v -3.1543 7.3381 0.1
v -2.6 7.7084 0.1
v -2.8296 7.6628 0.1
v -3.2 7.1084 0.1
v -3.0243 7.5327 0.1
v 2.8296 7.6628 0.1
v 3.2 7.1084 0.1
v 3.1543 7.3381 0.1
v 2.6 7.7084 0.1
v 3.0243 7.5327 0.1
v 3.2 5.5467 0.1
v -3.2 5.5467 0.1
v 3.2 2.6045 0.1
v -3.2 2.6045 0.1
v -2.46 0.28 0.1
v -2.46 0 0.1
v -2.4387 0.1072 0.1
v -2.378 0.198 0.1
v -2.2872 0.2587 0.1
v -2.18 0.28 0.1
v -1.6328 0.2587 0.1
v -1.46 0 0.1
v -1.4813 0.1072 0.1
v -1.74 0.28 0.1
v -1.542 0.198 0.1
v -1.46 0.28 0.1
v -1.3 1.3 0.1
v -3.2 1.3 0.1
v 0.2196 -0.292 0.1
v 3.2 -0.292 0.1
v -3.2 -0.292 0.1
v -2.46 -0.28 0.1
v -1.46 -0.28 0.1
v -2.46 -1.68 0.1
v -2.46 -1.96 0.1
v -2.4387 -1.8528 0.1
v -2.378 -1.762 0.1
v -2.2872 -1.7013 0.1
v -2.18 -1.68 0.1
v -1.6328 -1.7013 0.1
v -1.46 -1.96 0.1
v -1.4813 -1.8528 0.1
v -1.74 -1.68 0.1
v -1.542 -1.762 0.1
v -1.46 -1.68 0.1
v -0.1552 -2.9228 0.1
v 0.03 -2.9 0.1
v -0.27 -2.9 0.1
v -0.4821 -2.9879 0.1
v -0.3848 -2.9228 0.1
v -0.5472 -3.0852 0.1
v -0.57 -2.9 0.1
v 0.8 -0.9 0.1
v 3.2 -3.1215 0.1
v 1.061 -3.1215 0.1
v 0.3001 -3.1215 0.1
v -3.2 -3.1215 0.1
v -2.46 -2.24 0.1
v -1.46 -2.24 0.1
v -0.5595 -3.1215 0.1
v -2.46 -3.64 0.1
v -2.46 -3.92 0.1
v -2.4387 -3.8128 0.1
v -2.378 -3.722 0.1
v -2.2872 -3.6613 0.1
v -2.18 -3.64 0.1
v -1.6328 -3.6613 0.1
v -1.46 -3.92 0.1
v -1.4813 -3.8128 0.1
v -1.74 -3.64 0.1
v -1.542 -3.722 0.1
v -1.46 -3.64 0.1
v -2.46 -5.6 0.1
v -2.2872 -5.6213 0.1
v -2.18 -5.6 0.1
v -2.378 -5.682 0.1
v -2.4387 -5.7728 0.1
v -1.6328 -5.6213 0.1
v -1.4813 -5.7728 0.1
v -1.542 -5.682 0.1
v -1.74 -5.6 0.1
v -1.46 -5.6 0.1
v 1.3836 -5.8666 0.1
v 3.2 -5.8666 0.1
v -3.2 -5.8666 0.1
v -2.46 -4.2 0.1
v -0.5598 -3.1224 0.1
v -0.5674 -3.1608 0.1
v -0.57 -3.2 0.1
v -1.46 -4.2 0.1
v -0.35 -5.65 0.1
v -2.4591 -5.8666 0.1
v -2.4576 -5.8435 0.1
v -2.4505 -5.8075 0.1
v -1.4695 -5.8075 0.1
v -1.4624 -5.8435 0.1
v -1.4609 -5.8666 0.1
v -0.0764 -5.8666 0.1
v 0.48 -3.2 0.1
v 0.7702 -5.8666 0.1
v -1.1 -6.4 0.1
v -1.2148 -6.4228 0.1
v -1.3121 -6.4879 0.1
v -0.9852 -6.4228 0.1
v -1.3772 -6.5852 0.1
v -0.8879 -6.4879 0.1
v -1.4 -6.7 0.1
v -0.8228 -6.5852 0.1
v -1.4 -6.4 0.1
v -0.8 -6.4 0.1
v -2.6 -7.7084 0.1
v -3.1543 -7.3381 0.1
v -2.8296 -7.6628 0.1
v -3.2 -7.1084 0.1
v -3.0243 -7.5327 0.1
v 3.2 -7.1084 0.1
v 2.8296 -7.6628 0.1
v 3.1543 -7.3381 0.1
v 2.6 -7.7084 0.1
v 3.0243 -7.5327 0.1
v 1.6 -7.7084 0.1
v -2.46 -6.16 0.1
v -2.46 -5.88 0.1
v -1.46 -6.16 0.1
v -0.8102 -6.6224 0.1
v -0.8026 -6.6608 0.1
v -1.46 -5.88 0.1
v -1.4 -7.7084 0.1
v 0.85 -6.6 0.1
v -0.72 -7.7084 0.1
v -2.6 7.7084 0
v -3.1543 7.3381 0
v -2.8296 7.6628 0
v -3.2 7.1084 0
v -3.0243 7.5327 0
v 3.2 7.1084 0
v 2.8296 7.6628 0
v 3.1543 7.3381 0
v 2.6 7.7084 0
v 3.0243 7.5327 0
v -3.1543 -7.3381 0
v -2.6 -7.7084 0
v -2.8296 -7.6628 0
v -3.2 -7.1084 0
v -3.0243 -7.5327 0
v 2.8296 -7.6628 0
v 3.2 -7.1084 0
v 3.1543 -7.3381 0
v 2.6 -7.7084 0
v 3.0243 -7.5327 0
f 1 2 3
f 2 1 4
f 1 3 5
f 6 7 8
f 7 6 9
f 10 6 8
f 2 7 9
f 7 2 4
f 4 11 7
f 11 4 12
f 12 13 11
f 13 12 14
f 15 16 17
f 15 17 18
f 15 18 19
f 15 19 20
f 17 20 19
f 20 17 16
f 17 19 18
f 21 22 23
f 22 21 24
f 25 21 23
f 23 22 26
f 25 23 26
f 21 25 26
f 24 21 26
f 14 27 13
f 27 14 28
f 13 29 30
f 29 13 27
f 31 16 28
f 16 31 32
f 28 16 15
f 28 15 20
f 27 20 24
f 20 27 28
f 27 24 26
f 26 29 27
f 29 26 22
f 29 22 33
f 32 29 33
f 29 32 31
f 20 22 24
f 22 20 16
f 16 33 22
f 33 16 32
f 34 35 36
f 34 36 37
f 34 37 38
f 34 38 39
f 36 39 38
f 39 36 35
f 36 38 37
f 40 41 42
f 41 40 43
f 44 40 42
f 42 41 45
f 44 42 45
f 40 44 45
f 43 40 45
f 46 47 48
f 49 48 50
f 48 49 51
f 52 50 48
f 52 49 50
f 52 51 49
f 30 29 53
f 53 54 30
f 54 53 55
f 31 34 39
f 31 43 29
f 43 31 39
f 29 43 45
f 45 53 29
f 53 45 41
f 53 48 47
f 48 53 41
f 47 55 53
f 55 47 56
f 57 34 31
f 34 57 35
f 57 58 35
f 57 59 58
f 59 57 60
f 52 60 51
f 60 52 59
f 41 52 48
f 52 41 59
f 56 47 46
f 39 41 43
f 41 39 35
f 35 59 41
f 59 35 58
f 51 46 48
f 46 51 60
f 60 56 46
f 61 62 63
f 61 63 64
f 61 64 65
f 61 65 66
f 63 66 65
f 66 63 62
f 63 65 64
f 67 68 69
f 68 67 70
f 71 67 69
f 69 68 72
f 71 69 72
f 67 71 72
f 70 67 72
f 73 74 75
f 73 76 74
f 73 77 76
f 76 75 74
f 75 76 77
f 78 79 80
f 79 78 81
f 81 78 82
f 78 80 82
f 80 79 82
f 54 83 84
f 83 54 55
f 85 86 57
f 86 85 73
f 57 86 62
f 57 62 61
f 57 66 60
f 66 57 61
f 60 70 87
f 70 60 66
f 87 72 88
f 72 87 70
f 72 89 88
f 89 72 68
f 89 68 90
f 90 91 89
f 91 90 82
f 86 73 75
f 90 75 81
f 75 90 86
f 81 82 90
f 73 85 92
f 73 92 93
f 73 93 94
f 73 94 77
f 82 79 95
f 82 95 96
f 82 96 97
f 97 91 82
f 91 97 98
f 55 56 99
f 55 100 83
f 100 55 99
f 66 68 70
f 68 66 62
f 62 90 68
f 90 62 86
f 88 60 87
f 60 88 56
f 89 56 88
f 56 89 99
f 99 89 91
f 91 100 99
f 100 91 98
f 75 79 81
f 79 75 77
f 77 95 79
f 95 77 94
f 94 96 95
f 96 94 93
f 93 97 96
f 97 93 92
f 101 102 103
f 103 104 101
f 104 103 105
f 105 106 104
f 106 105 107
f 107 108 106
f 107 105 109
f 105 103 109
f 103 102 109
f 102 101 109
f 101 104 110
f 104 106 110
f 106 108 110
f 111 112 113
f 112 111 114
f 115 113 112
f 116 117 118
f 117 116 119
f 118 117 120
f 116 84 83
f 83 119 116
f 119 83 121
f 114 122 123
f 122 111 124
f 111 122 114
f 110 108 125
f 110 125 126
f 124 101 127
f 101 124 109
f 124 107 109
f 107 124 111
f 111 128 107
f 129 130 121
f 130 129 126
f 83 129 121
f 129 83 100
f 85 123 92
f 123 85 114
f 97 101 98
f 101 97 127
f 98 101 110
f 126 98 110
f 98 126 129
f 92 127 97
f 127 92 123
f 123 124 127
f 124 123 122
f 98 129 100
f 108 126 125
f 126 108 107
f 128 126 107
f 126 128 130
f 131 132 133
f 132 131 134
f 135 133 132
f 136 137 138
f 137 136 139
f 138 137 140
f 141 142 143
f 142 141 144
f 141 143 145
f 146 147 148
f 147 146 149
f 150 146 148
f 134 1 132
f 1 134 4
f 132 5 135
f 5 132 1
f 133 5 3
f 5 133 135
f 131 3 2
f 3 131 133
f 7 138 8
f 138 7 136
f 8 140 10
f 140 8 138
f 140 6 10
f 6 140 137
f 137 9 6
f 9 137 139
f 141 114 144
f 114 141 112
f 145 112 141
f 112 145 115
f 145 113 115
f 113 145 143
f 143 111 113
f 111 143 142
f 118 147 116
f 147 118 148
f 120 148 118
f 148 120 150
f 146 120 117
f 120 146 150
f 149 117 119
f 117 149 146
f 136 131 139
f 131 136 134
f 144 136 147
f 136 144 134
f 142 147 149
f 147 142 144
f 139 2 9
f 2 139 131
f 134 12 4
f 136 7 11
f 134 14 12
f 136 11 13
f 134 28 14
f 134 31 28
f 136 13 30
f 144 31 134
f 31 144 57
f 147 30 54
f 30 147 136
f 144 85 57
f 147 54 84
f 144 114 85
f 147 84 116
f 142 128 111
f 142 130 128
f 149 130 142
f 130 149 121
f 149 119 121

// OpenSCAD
// file: ../p/empty.scad
use <../lib.scad>
function ldraw_lib__empty() = [
// 0 Empty
// 0 Name: empty.dat
// 0 Author: Steffen [Steffen]
// 0 !LDRAW_ORG Primitive UPDATE 2015-01
// 0 !LICENSE Licensed under CC BY 2.0 and CC BY 4.0 : see CAreadme.txt
// 
// 0 BFC CERTIFY CCW
  [0,"BFC","CERTIFY"],
  [0,"BFC","CCW"],
// 
// 0 !HISTORY 2015-10-11 [PTadmin] Official Update 2015-01
// 
// 
// 0 // Tool MLCad cannot handle really empty files. This file is used as a workaround.
// 0 // It exceptionally contains forbidden non-LDRAW standard syntax to satisfy MLCad until it is fixed OR a different editor has become the de-facto LDRAW standard.
// 0 // The line being used here is an "impossible" conditional line which never should be visible,
// 0 // additionally hidden by a syntax explicitly hiding it from displaying.
// 
// 0 MLCAD HIDE 5 24 0 0 0 0.0001 0 0 0.0001 -0.0001 0 0 0 0
];
module ldraw_lib__empty(step=0, col=false, unit=2/5, alt=false, line=0.2, solid=!$preview)
    makepoly(ldraw_lib__empty(), step=step, col=col, unit=unit, alt=alt, line=line, solid=solid);
ldraw_lib__empty(line=0.2);
// file: ../p/1-4cyli.scad
use <../lib.scad>
function ldraw_lib__1_4cyli() = [
// 0 Cylinder 0.25
// 0 Name: 1-4cyli.dat
// 0 Author: James Jessiman
// 0 !LDRAW_ORG Primitive UPDATE 2012-01
// 0 !LICENSE Licensed under CC BY 2.0 and CC BY 4.0 : see CAreadme.txt
// 
// 0 BFC CERTIFY CCW
  [0,"BFC","CERTIFY"],
  [0,"BFC","CCW"],
// 
// 0 !HISTORY 2002-03-23 [sbliss] Added BFC statement.
// 0 !HISTORY 2002-04-25 [PTadmin] Official Update 2002-02
// 0 !HISTORY 2007-06-22 [PTadmin] Header formatted for Contributor Agreement
// 0 !HISTORY 2008-07-01 [PTadmin] Official Update 2008-01
// 0 !HISTORY 2012-02-16 [Philo] Changed to CCW
// 0 !HISTORY 2012-03-30 [PTadmin] Official Update 2012-01
// 
// 
// 4 16 1 1 0 0.9239 1 0.3827 0.9239 0 0.3827 1 0 0
  [4,16,1,1,0,0.9239,1,0.3827,0.9239,0,0.3827,1,0,0],
// 5 24 1 0 0 1 1 0 0.9239 0 0.3827 1 0 -1
  [5,24,1,0,0,1,1,0,0.9239,0,0.3827,1,0,-1],
// 4 16 0.9239 1 0.3827 0.7071 1 0.7071 0.7071 0 0.7071 0.9239 0 0.3827
  [4,16,0.9239,1,0.3827,0.7071,1,0.7071,0.7071,0,0.7071,0.9239,0,0.3827],
// 5 24 0.9239 0 0.3827 0.9239 1 0.3827 0.7071 0 0.7071 1 0 0
  [5,24,0.9239,0,0.3827,0.9239,1,0.3827,0.7071,0,0.7071,1,0,0],
// 4 16 0.7071 1 0.7071 0.3827 1 0.9239 0.3827 0 0.9239 0.7071 0 0.7071
  [4,16,0.7071,1,0.7071,0.3827,1,0.9239,0.3827,0,0.9239,0.7071,0,0.7071],
// 5 24 0.7071 0 0.7071 0.7071 1 0.7071 0.3827 0 0.9239 0.9239 0 0.3827
  [5,24,0.7071,0,0.7071,0.7071,1,0.7071,0.3827,0,0.9239,0.9239,0,0.3827],
// 4 16 0.3827 1 0.9239 0 1 1 0 0 1 0.3827 0 0.9239
  [4,16,0.3827,1,0.9239,0,1,1,0,0,1,0.3827,0,0.9239],
// 5 24 0.3827 0 0.9239 0.3827 1 0.9239 0 0 1 0.7071 0 0.7071
  [5,24,0.3827,0,0.9239,0.3827,1,0.9239,0,0,1,0.7071,0,0.7071],
// 5 24 0 0 1 0 1 1 0.3827 0 0.9239 -1 0 1
  [5,24,0,0,1,0,1,1,0.3827,0,0.9239,-1,0,1],
];
module ldraw_lib__1_4cyli(step=0, col=false, unit=2/5, alt=false, line=0.2, solid=!$preview)
    makepoly(ldraw_lib__1_4cyli(), step=step, col=col, unit=unit, alt=alt, line=line, solid=solid);
ldraw_lib__1_4cyli(line=0.2);
// file: ../p/7-16ndis.scad
use <../lib.scad>
function ldraw_lib__7_16ndis() = [
// 0 Disc Negative 0.4375
// 0 Name: 7-16ndis.dat
// 0 Author: Alex Taylor [anathema]
// 0 !LDRAW_ORG Primitive UPDATE 2010-01
// 0 !LICENSE Licensed under CC BY 2.0 and CC BY 4.0 : see CAreadme.txt
// 
// 0 BFC CERTIFY CCW
  [0,"BFC","CERTIFY"],
  [0,"BFC","CCW"],
// 
// 0 !HISTORY 2010-04-05 [PTadmin] Official Update 2010-01
// 
// 
// 3 16 1 0 1 0.9239 0 0.3827 1 0 0
  [3,16,1,0,1,0.9239,0,0.3827,1,0,0],
// 3 16 1 0 1 0.7071 0 0.7071 0.9239 0 0.3827
  [3,16,1,0,1,0.7071,0,0.7071,0.9239,0,0.3827],
// 3 16 1 0 1 0.3827 0 0.9239 0.7071 0 0.7071
  [3,16,1,0,1,0.3827,0,0.9239,0.7071,0,0.7071],
// 3 16 1 0 1 0 0 1 0.3827 0 0.9239
  [3,16,1,0,1,0,0,1,0.3827,0,0.9239],
// 3 16 -1 0 1 -0.3827 0 0.9239 0 0 1
  [3,16,-1,0,1,-0.3827,0,0.9239,0,0,1],
// 3 16 -1 0 1 -0.7071 0 0.7071 -0.3827 0 0.9239
  [3,16,-1,0,1,-0.7071,0,0.7071,-0.3827,0,0.9239],
// 3 16 -1 0 1 -0.9239 0 0.3827 -0.7071 0 0.7071
  [3,16,-1,0,1,-0.9239,0,0.3827,-0.7071,0,0.7071],
// 0
];
module ldraw_lib__7_16ndis(step=0, col=false, unit=2/5, alt=false, line=0.2, solid=!$preview)
    makepoly(ldraw_lib__7_16ndis(), step=step, col=col, unit=unit, alt=alt, line=line, solid=solid);
ldraw_lib__7_16ndis(line=0.2);
// file: ../p/7-16chrd.scad
use <../lib.scad>
function ldraw_lib__7_16chrd() = [
// 0 Chord 0.4375
// 0 Name: 7-16chrd.dat
// 0 Author: Guy Vivan [guyvivan]
// 0 !LDRAW_ORG Primitive UPDATE 2009-03
// 0 !LICENSE Licensed under CC BY 2.0 and CC BY 4.0 : see CAreadme.txt
// 
// 0 BFC CERTIFY CCW
  [0,"BFC","CERTIFY"],
  [0,"BFC","CCW"],
// 
// 0 !HISTORY 2009-12-29 [PTadmin] Official Update 2009-03
// 
// 
// 3 16 0.7071 0 0.7071 0.3827 0 0.9239 0 0 1
  [3,16,0.7071,0,0.7071,0.3827,0,0.9239,0,0,1],
// 4 16 0.7071 0 0.7071 0 0 1 -0.3827 0 0.9239 0.9239 0 0.3827
  [4,16,0.7071,0,0.7071,0,0,1,-0.3827,0,0.9239,0.9239,0,0.3827],
// 4 16 0.9239 0 0.3827 -0.3827 0 0.9239 -0.7071 0 0.7071 1 0 0
  [4,16,0.9239,0,0.3827,-0.3827,0,0.9239,-0.7071,0,0.7071,1,0,0],
// 3 16 -0.7071 0 0.7071 -0.9239 0 0.3827 1 0 0
  [3,16,-0.7071,0,0.7071,-0.9239,0,0.3827,1,0,0],
// 0
];
module ldraw_lib__7_16chrd(step=0, col=false, unit=2/5, alt=false, line=0.2, solid=!$preview)
    makepoly(ldraw_lib__7_16chrd(), step=step, col=col, unit=unit, alt=alt, line=line, solid=solid);
ldraw_lib__7_16chrd(line=0.2);
// file: ../p/3-16ndis.scad
use <../lib.scad>
function ldraw_lib__3_16ndis() = [
// 0 Disc Negative 0.1875
// 0 Name: 3-16ndis.dat
// 0 Author: Guy Vivan [guyvivan]
// 0 !LDRAW_ORG Primitive UPDATE 2009-01
// 0 !LICENSE Licensed under CC BY 2.0 and CC BY 4.0 : see CAreadme.txt
// 
// 0 BFC CERTIFY CCW
  [0,"BFC","CERTIFY"],
  [0,"BFC","CCW"],
// 
// 0 !HISTORY 2009-05-02 [PTadmin] Official Update 2009-01
// 
// 
// 3 16 1 0 1 0.9239 0 0.3827 1 0 0
  [3,16,1,0,1,0.9239,0,0.3827,1,0,0],
// 3 16 1 0 1 0.7071 0 0.7071 0.9239 0 0.3827
  [3,16,1,0,1,0.7071,0,0.7071,0.9239,0,0.3827],
// 3 16 1 0 1 0.3827 0 0.9239 0.7071 0 0.7071
  [3,16,1,0,1,0.3827,0,0.9239,0.7071,0,0.7071],
// 
// 0 end of file
// 
];
module ldraw_lib__3_16ndis(step=0, col=false, unit=2/5, alt=false, line=0.2, solid=!$preview)
    makepoly(ldraw_lib__3_16ndis(), step=step, col=col, unit=unit, alt=alt, line=line, solid=solid);
ldraw_lib__3_16ndis(line=0.2);
// file: ../p/3-16chrd.scad
use <../lib.scad>
function ldraw_lib__3_16chrd() = [
// 0 Chord 0.1875
// 0 Name: 3-16chrd.dat
// 0 Author: Niels Karsdorp [nielsk]
// 0 !LDRAW_ORG Primitive UPDATE 2009-01
// 0 !LICENSE Licensed under CC BY 2.0 and CC BY 4.0 : see CAreadme.txt
// 
// 0 BFC CERTIFY CCW
  [0,"BFC","CERTIFY"],
  [0,"BFC","CCW"],
// 
// 0 !HISTORY 2009-05-02 [PTadmin] Official Update 2009-01
// 
// 
// 4 16 1 0 0 0.9239 0 0.3827 0.7071 0 0.7071 0.3827 0 0.9239
  [4,16,1,0,0,0.9239,0,0.3827,0.7071,0,0.7071,0.3827,0,0.9239],
// 0
// 
];
module ldraw_lib__3_16chrd(step=0, col=false, unit=2/5, alt=false, line=0.2, solid=!$preview)
    makepoly(ldraw_lib__3_16chrd(), step=step, col=col, unit=unit, alt=alt, line=line, solid=solid);
ldraw_lib__3_16chrd(line=0.2);
// file: ../p/1-16ndis.scad
use <../lib.scad>
function ldraw_lib__1_16ndis() = [
// 0 Disc Negative 0.0625
// 0 Name: 1-16ndis.dat
// 0 Author: Niels Karsdorp [nielsk]
// 0 !LDRAW_ORG Primitive UPDATE 2009-01
// 0 !LICENSE Licensed under CC BY 2.0 and CC BY 4.0 : see CAreadme.txt
// 
// 0 BFC CERTIFY CCW
  [0,"BFC","CERTIFY"],
  [0,"BFC","CCW"],
// 
// 0 !HISTORY 2009-05-02 [PTadmin] Official Update 2009-01
// 
// 
// 3 16 1 0 0 1 0 1 0.9239 0 0.3827
  [3,16,1,0,0,1,0,1,0.9239,0,0.3827],
// 0
];
module ldraw_lib__1_16ndis(step=0, col=false, unit=2/5, alt=false, line=0.2, solid=!$preview)
    makepoly(ldraw_lib__1_16ndis(), step=step, col=col, unit=unit, alt=alt, line=line, solid=solid);
ldraw_lib__1_16ndis(line=0.2);
// file: ../p/1-16chrd.scad
use <../lib.scad>
use <empty.scad>
function ldraw_lib__1_16chrd() = [
// 0 Chord 0.0625
// 0 Name: 1-16chrd.dat
// 0 Author: Philippe Hurbain [Philo]
// 0 !LDRAW_ORG Primitive UPDATE 2015-01
// 0 !LICENSE Licensed under CC BY 2.0 and CC BY 4.0 : see CAreadme.txt
// 
// 0 BFC CERTIFY CCW
  [0,"BFC","CERTIFY"],
  [0,"BFC","CCW"],
// 
// 0 !HISTORY 2015-10-11 [PTadmin] Official Update 2015-01
// 
// 
// 0 // This file is intentionally empty because at the current \P resolution,
// 0 // an 1-16chrd is actually empty. However, this file still is present
// 0 // to allow tools to do primitives substition and fill in a real chrd here,
// 0 // or, if desired, to substitute this with the hi-res 48\1-16chrd.
// 
// 0 // This file is based on an idea by Darats at http://forums.ldraw.org/read.php?19,14500,14500#msg-14500
// 
// 1 16 0 0 0 1 0 0 0 1 0 0 0 1 empty.dat
  [1,16,0,0,0,1,0,0,0,1,0,0,0,1, ldraw_lib__empty()],
];
module ldraw_lib__1_16chrd(step=0, col=false, unit=2/5, alt=false, line=0.2, solid=!$preview)
    makepoly(ldraw_lib__1_16chrd(), step=step, col=col, unit=unit, alt=alt, line=line, solid=solid);
ldraw_lib__1_16chrd(line=0.2);
// file: ../p/1-4ndis.scad
use <../lib.scad>
function ldraw_lib__1_4ndis() = [
// 0 Disc Negative 0.25
// 0 Name: 1-4ndis.dat
// 0 Author: James Jessiman
// 0 !LDRAW_ORG Primitive UPDATE 2012-01
// 0 !LICENSE Licensed under CC BY 2.0 and CC BY 4.0 : see CAreadme.txt
// 
// 0 BFC CERTIFY CCW
  [0,"BFC","CERTIFY"],
  [0,"BFC","CCW"],
// 
// 0 !HISTORY 2002-03-23 [sbliss] Added BFC Statement
// 0 !HISTORY 2002-04-25 [PTadmin] Official Update 2002-02
// 0 !HISTORY 2007-06-22 [PTadmin] Header formatted for Contributor Agreement
// 0 !HISTORY 2008-07-01 [PTadmin] Official Update 2008-01
// 0 !HISTORY 2012-02-16 [Philo] Changed to CCW
// 0 !HISTORY 2012-03-30 [PTadmin] Official Update 2012-01
// 
// 
// 3 16 0.9239 0 0.3827 1 0 0 1 0 1
  [3,16,0.9239,0,0.3827,1,0,0,1,0,1],
// 3 16 0.7071 0 0.7071 0.9239 0 0.3827 1 0 1
  [3,16,0.7071,0,0.7071,0.9239,0,0.3827,1,0,1],
// 3 16 0.3827 0 0.9239 0.7071 0 0.7071 1 0 1
  [3,16,0.3827,0,0.9239,0.7071,0,0.7071,1,0,1],
// 3 16 0 0 1 0.3827 0 0.9239 1 0 1
  [3,16,0,0,1,0.3827,0,0.9239,1,0,1],
];
module ldraw_lib__1_4ndis(step=0, col=false, unit=2/5, alt=false, line=0.2, solid=!$preview)
    makepoly(ldraw_lib__1_4ndis(), step=step, col=col, unit=unit, alt=alt, line=line, solid=solid);
ldraw_lib__1_4ndis(line=0.2);
// file: ../p/1-4chrd.scad
use <../lib.scad>
function ldraw_lib__1_4chrd() = [
// 0 Chord 0.25
// 0 Name: 1-4chrd.dat
// 0 Author: Tony Hafner [hafhead]
// 0 !LDRAW_ORG Primitive UPDATE 2012-02
// 0 !LICENSE Licensed under CC BY 2.0 and CC BY 4.0 : see CAreadme.txt
// 
// 0 BFC CERTIFY CCW
  [0,"BFC","CERTIFY"],
  [0,"BFC","CCW"],
// 
// 0 !HISTORY 2004-04-22 [PTadmin] Official Update 2004-02
// 0 !HISTORY 2007-10-09 [PTadmin] Header formatted for Contributor Agreement
// 0 !HISTORY 2008-07-01 [PTadmin] Official Update 2008-01
// 0 !HISTORY 2012-08-02 [MMR1988] Re-creation with PrimGen2 and Rectifier
// 0 !HISTORY 2012-08-09 [PTadmin] Official Update 2012-02
// 
// 
// 4 16 0.9239 0 0.3827 0.3827 0 0.9239 0 0 1 1 0 0
  [4,16,0.9239,0,0.3827,0.3827,0,0.9239,0,0,1,1,0,0],
// 3 16 0.7071 0 0.7071 0.3827 0 0.9239 0.9239 0 0.3827
  [3,16,0.7071,0,0.7071,0.3827,0,0.9239,0.9239,0,0.3827],
];
module ldraw_lib__1_4chrd(step=0, col=false, unit=2/5, alt=false, line=0.2, solid=!$preview)
    makepoly(ldraw_lib__1_4chrd(), step=step, col=col, unit=unit, alt=alt, line=line, solid=solid);
ldraw_lib__1_4chrd(line=0.2);
// file: s/6142622ms06.scad
use <../../lib.scad>
use <../../p/1-4chrd.scad>
use <../../p/1-4cyli.scad>
function ldraw_lib__s__6142622ms06() = [
// 0 ~Sticker  1.9 x  0.8 with Black Headlamp on Yellow Background Right - Underside Flat
// 0 Name: s\6142622ms06.dat
// 0 Author: Massimo Maso [Sirio]
// 0 !LDRAW_ORG Subpart UPDATE 2022-03
// 0 !LICENSE Licensed under CC BY 2.0 and CC BY 4.0 : see CAreadme.txt
// 
// 0 BFC CERTIFY CCW
  [0,"BFC","CERTIFY"],
  [0,"BFC","CCW"],
// 
// 0 !HISTORY 2022-05-07 [PTadmin] Official Update 2022-03
// 
// 
// 0 // Primitives
// 
// 1 16 -6.5 0 17.7711 -1.5 0 0 0 -1 0 0 0 1.5 1-4chrd.dat
  [1,16,-6.5,0,17.7711,-1.5,0,0,0,-1,0,0,0,1.5, ldraw_lib__1_4chrd()],
// 1 16 6.5 0 17.7711 1.5 0 0 0 -1 0 0 0 1.5 1-4chrd.dat
  [1,16,6.5,0,17.7711,1.5,0,0,0,-1,0,0,0,1.5, ldraw_lib__1_4chrd()],
// 1 16 -6.5 0 -17.7711 -1.5 0 0 0 -1 0 0 0 -1.5 1-4chrd.dat
  [1,16,-6.5,0,-17.7711,-1.5,0,0,0,-1,0,0,0,-1.5, ldraw_lib__1_4chrd()],
// 1 16 6.5 0 -17.7711 1.5 0 0 0 -1 0 0 0 -1.5 1-4chrd.dat
  [1,16,6.5,0,-17.7711,1.5,0,0,0,-1,0,0,0,-1.5, ldraw_lib__1_4chrd()],
// 1 16 -6.5 -0.25 17.7711 -1.5 0 0 0 0.25 0 0 0 1.5 1-4cyli.dat
  [1,16,-6.5,-0.25,17.7711,-1.5,0,0,0,0.25,0,0,0,1.5, ldraw_lib__1_4cyli()],
// 1 16 6.5 -0.25 17.7711 1.5 0 0 0 0.25 0 0 0 1.5 1-4cyli.dat
  [1,16,6.5,-0.25,17.7711,1.5,0,0,0,0.25,0,0,0,1.5, ldraw_lib__1_4cyli()],
// 1 16 -6.5 -0.25 -17.7711 -1.5 0 0 0 0.25 0 0 0 -1.5 1-4cyli.dat
  [1,16,-6.5,-0.25,-17.7711,-1.5,0,0,0,0.25,0,0,0,-1.5, ldraw_lib__1_4cyli()],
// 1 16 6.5 -0.25 -17.7711 1.5 0 0 0 0.25 0 0 0 -1.5 1-4cyli.dat
  [1,16,6.5,-0.25,-17.7711,1.5,0,0,0,0.25,0,0,0,-1.5, ldraw_lib__1_4cyli()],
// 0 // Bottom face
// 4 16 6.5 0 19.2711 8 0 17.7711 -8 0 17.7711 -6.5 0 19.2711
  [4,16,6.5,0,19.2711,8,0,17.7711,-8,0,17.7711,-6.5,0,19.2711],
// 4 16 8 0 17.7711 8 0 -17.7711 -8 0 -17.7711 -8 0 17.7711
  [4,16,8,0,17.7711,8,0,-17.7711,-8,0,-17.7711,-8,0,17.7711],
// 4 16 8 0 -17.7711 6.5 0 -19.2711 -6.5 0 -19.2711 -8 0 -17.7711
  [4,16,8,0,-17.7711,6.5,0,-19.2711,-6.5,0,-19.2711,-8,0,-17.7711],
// 0 // Lateral face
// 4 16 -6.5 0 19.2711 -6.5 -.25 19.2711 6.5 -.25 19.2711 6.5 0 19.2711
  [4,16,-6.5,0,19.2711,-6.5,-.25,19.2711,6.5,-.25,19.2711,6.5,0,19.2711],
// 3 16 -8 0 17.7711 -8 -.25 13.8668 -8 -.25 17.7711
  [3,16,-8,0,17.7711,-8,-.25,13.8668,-8,-.25,17.7711],
// 3 16 8 0 17.7711 8 -.25 17.7711 8 -.25 13.8668
  [3,16,8,0,17.7711,8,-.25,17.7711,8,-.25,13.8668],
// 3 16 -8 0 17.7711 -8 -.25 6.5112 -8 -.25 13.8668
  [3,16,-8,0,17.7711,-8,-.25,6.5112,-8,-.25,13.8668],
// 3 16 8 0 17.7711 8 -.25 13.8668 8 -.25 6.5112
  [3,16,8,0,17.7711,8,-.25,13.8668,8,-.25,6.5112],
// 3 16 -8 0 17.7711 -8 -.25 3.25 -8 -.25 6.5112
  [3,16,-8,0,17.7711,-8,-.25,3.25,-8,-.25,6.5112],
// 3 16 -8 0 17.7711 -8 -.25 -.73 -8 -.25 3.25
  [3,16,-8,0,17.7711,-8,-.25,-.73,-8,-.25,3.25],
// 3 16 8 0 17.7711 8 -.25 6.5112 8 -.25 -.73
  [3,16,8,0,17.7711,8,-.25,6.5112,8,-.25,-.73],
// 4 16 -8 0 17.7711 -8 0 -17.7711 -8 -.25 -7.8038 -8 -.25 -.73
  [4,16,-8,0,17.7711,-8,0,-17.7711,-8,-.25,-7.8038,-8,-.25,-.73],
// 4 16 8 0 17.7711 8 -.25 -.73 8 -.25 -7.8038 8 0 -17.7711
  [4,16,8,0,17.7711,8,-.25,-.73,8,-.25,-7.8038,8,0,-17.7711],
// 3 16 -8 0 -17.7711 -8 -.25 -14.6666 -8 -.25 -7.8038
  [3,16,-8,0,-17.7711,-8,-.25,-14.6666,-8,-.25,-7.8038],
// 3 16 8 0 -17.7711 8 -.25 -7.8038 8 -.25 -14.6666
  [3,16,8,0,-17.7711,8,-.25,-7.8038,8,-.25,-14.6666],
// 3 16 -8 0 -17.7711 -8 -.25 -17.7711 -8 -.25 -14.6666
  [3,16,-8,0,-17.7711,-8,-.25,-17.7711,-8,-.25,-14.6666],
// 3 16 8 0 -17.7711 8 -.25 -14.6666 8 -.25 -17.7711
  [3,16,8,0,-17.7711,8,-.25,-14.6666,8,-.25,-17.7711],
// 3 16 -6.5 0 -19.2711 -3.5 -.25 -19.2711 -6.5 -.25 -19.2711
  [3,16,-6.5,0,-19.2711,-3.5,-.25,-19.2711,-6.5,-.25,-19.2711],
// 3 16 -6.5 0 -19.2711 -1.8 -.25 -19.2711 -3.5 -.25 -19.2711
  [3,16,-6.5,0,-19.2711,-1.8,-.25,-19.2711,-3.5,-.25,-19.2711],
// 4 16 -6.5 0 -19.2711 6.5 0 -19.2711 4 -.25 -19.2711 -1.8 -.25 -19.2711
  [4,16,-6.5,0,-19.2711,6.5,0,-19.2711,4,-.25,-19.2711,-1.8,-.25,-19.2711],
// 3 16 6.5 0 -19.2711 6.5 -.25 -19.2711 4 -.25 -19.2711
  [3,16,6.5,0,-19.2711,6.5,-.25,-19.2711,4,-.25,-19.2711],
];
module ldraw_lib__s__6142622ms06(step=0, col=false, unit=2/5, alt=false, line=0.2, solid=!$preview)
    makepoly(ldraw_lib__s__6142622ms06(), step=step, col=col, unit=unit, alt=alt, line=line, solid=solid);
ldraw_lib__s__6142622ms06(line=0.2);
// file: s/6142622ms05.scad
use <../../lib.scad>
use <../../p/1-4chrd.scad>
use <../../p/7-16chrd.scad>
use <../../p/7-16ndis.scad>
function ldraw_lib__s__6142622ms05() = [
// 0 ~Sticker  1.9 x  0.8 with Black Headlamp on Yellow Background Right - Upper Section 6
// 0 Name: s\6142622ms05.dat
// 0 Author: Massimo Maso [Sirio]
// 0 !LDRAW_ORG Subpart UPDATE 2022-03
// 0 !LICENSE Licensed under CC BY 2.0 and CC BY 4.0 : see CAreadme.txt
// 
// 0 BFC CERTIFY CCW
  [0,"BFC","CERTIFY"],
  [0,"BFC","CCW"],
// 
// 0 !HISTORY 2022-05-07 [PTadmin] Official Update 2022-03
// 
// 
// 0 // Primitives
// 
// 1 15 -2.75 -.25 -2.069 -.75 0 0 0 1 0 0 0 .75 7-16chrd.dat
  [1,15,-2.75,-.25,-2.069,-.75,0,0,0,1,0,0,0,.75, ldraw_lib__7_16chrd()],
// 1 0 -2.75 -.25 -2.069 -.75 0 0 0 1 0 0 0 .75 7-16ndis.dat
  [1,0,-2.75,-.25,-2.069,-.75,0,0,0,1,0,0,0,.75, ldraw_lib__7_16ndis()],
// 1 0 -6.5 -.25 -3.0901 -1.5 0 0 0 1 0 0 0 -1.5 1-4chrd.dat
  [1,0,-6.5,-.25,-3.0901,-1.5,0,0,0,1,0,0,0,-1.5, ldraw_lib__1_4chrd()],
// 1 14 6.5 -.25 -3.0901 1.5 0 0 0 1 0 0 0 -1.5 1-4chrd.dat
  [1,14,6.5,-.25,-3.0901,1.5,0,0,0,1,0,0,0,-1.5, ldraw_lib__1_4chrd()],
// 0 // Yellow faces
// 3 14 8 -.25 -3.0901 8 -.25 .0144 3.459 -.25 .0144
  [3,14,8,-.25,-3.0901,8,-.25,.0144,3.459,-.25,.0144],
// 4 14 8 -.25 -3.0901 3.459 -.25 .0144 4 -.25 -4.5901 6.5 -.25 -4.5901
  [4,14,8,-.25,-3.0901,3.459,-.25,.0144,4,-.25,-4.5901,6.5,-.25,-4.5901],
// 0 // Black faces
// 3 0 -8 -.25 -3.0901 -6.15 -.25 -.719 -6.15 -.25 -.019
  [3,0,-8,-.25,-3.0901,-6.15,-.25,-.719,-6.15,-.25,-.019],
// 4 0 -8 -.25 -3.0901 -6.5 -.25 -4.5901 -3.65 -.25 -.719 -6.15 -.25 -.719
  [4,0,-8,-.25,-3.0901,-6.5,-.25,-4.5901,-3.65,-.25,-.719,-6.15,-.25,-.719],
// 3 0 -2 -.25 -1.319 -2.057075 -.25 -1.781975 -2.0256 -.25 -1.8749
  [3,0,-2,-.25,-1.319,-2.057075,-.25,-1.781975,-2.0256,-.25,-1.8749],
// 3 0 -2 -.25 -1.319 -2.0256 -.25 -1.8749 -2.0064 -.25 -1.9711
  [3,0,-2,-.25,-1.319,-2.0256,-.25,-1.8749,-2.0064,-.25,-1.9711],
// 4 0 -3.65 -.25 -.019 -3.65 -.25 -.719 -3.5 -.25 -1.319 -2.75 -.25 -1.319
  [4,0,-3.65,-.25,-.019,-3.65,-.25,-.719,-3.5,-.25,-1.319,-2.75,-.25,-1.319],
// 4 0 -3.65 -.25 -.719 -6.5 -.25 -4.5901 -3.5 -.25 -2.069 -3.5 -.25 -1.319
  [4,0,-3.65,-.25,-.719,-6.5,-.25,-4.5901,-3.5,-.25,-2.069,-3.5,-.25,-1.319],
// 3 0 -6.5 -.25 -4.5901 -3.5 -.25 -4.5901 -3.5 -.25 -2.069
  [3,0,-6.5,-.25,-4.5901,-3.5,-.25,-4.5901,-3.5,-.25,-2.069],
// 4 0 4 -.25 -4.5901 2.125 -.25 -1.819 -2.0064 -.25 -1.9711 -1.8 -.25 -4.5901
  [4,0,4,-.25,-4.5901,2.125,-.25,-1.819,-2.0064,-.25,-1.9711,-1.8,-.25,-4.5901],
// 4 0 4 -.25 -4.5901 3.459 -.25 .0144 1.9255 -.25 .0144 2.125 -.25 -1.819
  [4,0,4,-.25,-4.5901,3.459,-.25,.0144,1.9255,-.25,.0144,2.125,-.25,-1.819],
// 4 0 -8 -.25 -3.0901 -6.15 -.25 -.019 -6.1478 -.25 .0144 -8 -.25 .0144
  [4,0,-8,-.25,-3.0901,-6.15,-.25,-.019,-6.1478,-.25,.0144,-8,-.25,.0144],
// 4 0 -.1909 -.25 .0144 -3.6522 -.25 .0144 -3.65 -.25 -.019 -2.75 -.25 -1.319
  [4,0,-.1909,-.25,.0144,-3.6522,-.25,.0144,-3.65,-.25,-.019,-2.75,-.25,-1.319],
// 3 0 -.1909 -.25 .0144 -2.75 -.25 -1.319 -2 -.25 -1.319
  [3,0,-.1909,-.25,.0144,-2.75,-.25,-1.319,-2,-.25,-1.319],
// 4 0 2.125 -.25 -1.819 -.1909 -.25 .0144 -2 -.25 -1.319 -2.0064 -.25 -1.9711
  [4,0,2.125,-.25,-1.819,-.1909,-.25,.0144,-2,-.25,-1.319,-2.0064,-.25,-1.9711],
// 0 // Light grey faces
// 4 7 -3.6522 -.25 .0144 -6.1478 -.25 .0144 -6.15 -.25 -.019 -3.65 -.25 -.019
  [4,7,-3.6522,-.25,.0144,-6.1478,-.25,.0144,-6.15,-.25,-.019,-3.65,-.25,-.019],
// 4 7 -6.15 -.25 -.019 -6.15 -.25 -.719 -3.65 -.25 -.719 -3.65 -.25 -.019
  [4,7,-6.15,-.25,-.019,-6.15,-.25,-.719,-3.65,-.25,-.719,-3.65,-.25,-.019],
// 3 7 -.1909 -.25 .0144 2.125 -.25 -1.819 1.9255 -.25 .0144
  [3,7,-.1909,-.25,.0144,2.125,-.25,-1.819,1.9255,-.25,.0144],
// 0 // White faces
// 4 15 -3.5 -.25 -2.069 -2.0064 -.25 -1.9711 -2.0256 -.25 -1.8749 -2.057075 -.25 -1.781975
  [4,15,-3.5,-.25,-2.069,-2.0064,-.25,-1.9711,-2.0256,-.25,-1.8749,-2.057075,-.25,-1.781975],
// 4 15 -3.5 -.25 -2.069 -3.5 -.25 -4.5901 -1.8 -.25 -4.5901 -2.0064 -.25 -1.9711
  [4,15,-3.5,-.25,-2.069,-3.5,-.25,-4.5901,-1.8,-.25,-4.5901,-2.0064,-.25,-1.9711],
];
module ldraw_lib__s__6142622ms05(step=0, col=false, unit=2/5, alt=false, line=0.2, solid=!$preview)
    makepoly(ldraw_lib__s__6142622ms05(), step=step, col=col, unit=unit, alt=alt, line=line, solid=solid);
ldraw_lib__s__6142622ms05(line=0.2);
// file: s/6142622ms04.scad
use <../../lib.scad>
use <../../p/1-4chrd.scad>
use <../../p/1-4ndis.scad>
use <../../p/3-16chrd.scad>
use <../../p/3-16ndis.scad>
function ldraw_lib__s__6142622ms04() = [
// 0 ~Sticker  1.9 x  0.8 with Black Headlamp on Yellow Background Right - Upper Section 5
// 0 Name: s\6142622ms04.dat
// 0 Author: Massimo Maso [Sirio]
// 0 !LDRAW_ORG Subpart UPDATE 2022-03
// 0 !LICENSE Licensed under CC BY 2.0 and CC BY 4.0 : see CAreadme.txt
// 
// 0 BFC CERTIFY CCW
  [0,"BFC","CERTIFY"],
  [0,"BFC","CCW"],
// 
// 0 !HISTORY 2022-05-07 [PTadmin] Official Update 2022-03
// 
// 
// 0 // Primitives
// 
// 1 0 -5.45 -.25 4.8522 -.7 0 0 0 1 0 0 0 .7 1-4ndis.dat
  [1,0,-5.45,-.25,4.8522,-.7,0,0,0,1,0,0,0,.7, ldraw_lib__1_4ndis()],
// 1 7 -5.45 -.25 4.8522 -.7 0 0 0 1 0 0 0 .7 1-4chrd.dat
  [1,7,-5.45,-.25,4.8522,-.7,0,0,0,1,0,0,0,.7, ldraw_lib__1_4chrd()],
// 1 7 -4.35 -.25 4.8522 .7 0 0 0 1 0 0 0 .7 1-4chrd.dat
  [1,7,-4.35,-.25,4.8522,.7,0,0,0,1,0,0,0,.7, ldraw_lib__1_4chrd()],
// 1 0 -4.35 -.25 4.8522 .7 0 0 0 1 0 0 0 .7 1-4ndis.dat
  [1,0,-4.35,-.25,4.8522,.7,0,0,0,1,0,0,0,.7, ldraw_lib__1_4ndis()],
// 1 0 -5.45 -.25 -.0478 0 0 -.7 0 1 0 .7 0 0 3-16ndis.dat
  [1,0,-5.45,-.25,-.0478,0,0,-.7,0,1,0,.7,0,0, ldraw_lib__3_16ndis()],
// 1 7 -5.45 -.25 -.0478 0 0 -.7 0 1 0 .7 0 0 3-16chrd.dat
  [1,7,-5.45,-.25,-.0478,0,0,-.7,0,1,0,.7,0,0, ldraw_lib__3_16chrd()],
// 1 7 -4.35 -.25 -.0478 0 0 .7 0 1 0 .7 0 0 3-16chrd.dat
  [1,7,-4.35,-.25,-.0478,0,0,.7,0,1,0,.7,0,0, ldraw_lib__3_16chrd()],
// 1 0 -4.35 -.25 -.0478 0 0 .7 0 1 0 .7 0 0 3-16ndis.dat
  [1,0,-4.35,-.25,-.0478,0,0,.7,0,1,0,.7,0,0, ldraw_lib__3_16ndis()],
// 0 // Yellow faces
// 4 14 8 -.25 6.8484 2.6526 -.25 6.8484 3.459 -.25 -.0144 8 -.25 -.0144
  [4,14,8,-.25,6.8484,2.6526,-.25,6.8484,3.459,-.25,-.0144,8,-.25,-.0144],
// 0 // Black faces
// 4 0 -8 -.25 6.8484 -8 -.25 -.0144 -6.15 -.25 .6522 -6.15 -.25 4.1522
  [4,0,-8,-.25,6.8484,-8,-.25,-.0144,-6.15,-.25,.6522,-6.15,-.25,4.1522],
// 3 0 -8 -.25 6.8484 -6.15 -.25 4.1522 -6.15 -.25 4.8522
  [3,0,-8,-.25,6.8484,-6.15,-.25,4.1522,-6.15,-.25,4.8522],
// 3 0 -8 -.25 6.8484 -6.15 -.25 4.8522 -6.15 -.25 5.5522
  [3,0,-8,-.25,6.8484,-6.15,-.25,4.8522,-6.15,-.25,5.5522],
// 4 0 -8 -.25 6.8484 -6.15 -.25 5.5522 -5.45 -.25 5.5522 -1.3987 -.25 6.8484
  [4,0,-8,-.25,6.8484,-6.15,-.25,5.5522,-5.45,-.25,5.5522,-1.3987,-.25,6.8484],
// 4 0 -1.3994 -.25 6.8463 -1.3987 -.25 6.8484 -5.45 -.25 5.5522 -4.35 -.25 5.5522
  [4,0,-1.3994,-.25,6.8463,-1.3987,-.25,6.8484,-5.45,-.25,5.5522,-4.35,-.25,5.5522],
// 4 0 -1.3994 -.25 6.8463 -4.35 -.25 5.5522 -3.65 -.25 5.5522 -1.4186 -.25 6.7501
  [4,0,-1.3994,-.25,6.8463,-4.35,-.25,5.5522,-3.65,-.25,5.5522,-1.4186,-.25,6.7501],
// 4 0 -1.425 -.25 6.6522 -1.4186 -.25 6.7501 -3.65 -.25 5.5522 -3.65 -.25 4.8522
  [4,0,-1.425,-.25,6.6522,-1.4186,-.25,6.7501,-3.65,-.25,5.5522,-3.65,-.25,4.8522],
// 3 0 -1.425 -.25 6.6522 -3.65 -.25 4.8522 -3.65 -.25 4.1522
  [3,0,-1.425,-.25,6.6522,-3.65,-.25,4.8522,-3.65,-.25,4.1522],
// 4 0 -1.425 -.25 6.6522 -3.65 -.25 4.1522 -3.65 -.25 .6522 -.875 -.25 .5272
  [4,0,-1.425,-.25,6.6522,-3.65,-.25,4.1522,-3.65,-.25,.6522,-.875,-.25,.5272],
// 3 0 -6.15 -.25 4.1522 -6.15 -.25 .6522 -5.45 -.25 .6522
  [3,0,-6.15,-.25,4.1522,-6.15,-.25,.6522,-5.45,-.25,.6522],
// 4 0 -6.15 -.25 4.1522 -5.45 -.25 .6522 -4.35 -.25 .6522 -3.65 -.25 4.1522
  [4,0,-6.15,-.25,4.1522,-5.45,-.25,.6522,-4.35,-.25,.6522,-3.65,-.25,4.1522],
// 3 0 -4.35 -.25 .6522 -3.65 -.25 .6522 -3.65 -.25 4.1522
  [3,0,-4.35,-.25,.6522,-3.65,-.25,.6522,-3.65,-.25,4.1522],
// 3 0 -6.15 -.25 .6522 -8 -.25 -.0144 -6.1478 -.25 -.0144
  [3,0,-6.15,-.25,.6522,-8,-.25,-.0144,-6.1478,-.25,-.0144],
// 3 0 -6.15 -.25 .6522 -6.1478 -.25 -.0144 -6.14398 -.25 .04355
  [3,0,-6.15,-.25,.6522,-6.1478,-.25,-.0144,-6.14398,-.25,.04355],
// 3 0 -6.15 -.25 .6522 -6.14398 -.25 .04355 -6.12613 -.25 .13336
  [3,0,-6.15,-.25,.6522,-6.14398,-.25,.04355,-6.12613,-.25,.13336],
// 3 0 -6.15 -.25 .6522 -6.12613 -.25 .13336 -6.09673 -.25 .22009
  [3,0,-6.15,-.25,.6522,-6.12613,-.25,.13336,-6.09673,-.25,.22009],
// 3 0 -3.65 -.25 .6522 -3.70327 -.25 .22009 -3.67387 -.25 .13336
  [3,0,-3.65,-.25,.6522,-3.70327,-.25,.22009,-3.67387,-.25,.13336],
// 3 0 -3.65 -.25 .6522 -3.67387 -.25 .13336 -3.65602 -.25 .04355
  [3,0,-3.65,-.25,.6522,-3.67387,-.25,.13336,-3.65602,-.25,.04355],
// 3 0 -3.65 -.25 .6522 -3.65602 -.25 .04355 -3.6522 -.25 -.0144
  [3,0,-3.65,-.25,.6522,-3.65602,-.25,.04355,-3.6522,-.25,-.0144],
// 4 0 -3.65 -.25 .6522 -3.6522 -.25 -.0144 -.1909 -.25 -.0144 -.875 -.25 .5272
  [4,0,-3.65,-.25,.6522,-3.6522,-.25,-.0144,-.1909,-.25,-.0144,-.875,-.25,.5272],
// 3 0 2.6526 -.25 6.8484 .7503 -.25 6.8484 1.2 -.25 6.6522
  [3,0,2.6526,-.25,6.8484,.7503,-.25,6.8484,1.2,-.25,6.6522],
// 4 0 2.6526 -.25 6.8484 1.2 -.25 6.6522 1.9255 -.25 -.0144 3.459 -.25 -.0144
  [4,0,2.6526,-.25,6.8484,1.2,-.25,6.6522,1.9255,-.25,-.0144,3.459,-.25,-.0144],
// 0 // Light grey faces
// 4 7 -6.15 -.25 4.8522 -3.65 -.25 4.8522 -4.35 -.25 5.5522 -5.45 -.25 5.5522
  [4,7,-6.15,-.25,4.8522,-3.65,-.25,4.8522,-4.35,-.25,5.5522,-5.45,-.25,5.5522],
// 4 7 -6.15 -.25 4.8522 -6.15 -.25 4.1522 -3.65 -.25 4.1522 -3.65 -.25 4.8522
  [4,7,-6.15,-.25,4.8522,-6.15,-.25,4.1522,-3.65,-.25,4.1522,-3.65,-.25,4.8522],
// 4 7 .7503 -.25 6.8484 -1.3987 -.25 6.8484 -1.3994 -.25 6.8463 -1.4186 -.25 6.7501
  [4,7,.7503,-.25,6.8484,-1.3987,-.25,6.8484,-1.3994,-.25,6.8463,-1.4186,-.25,6.7501],
// 4 7 .7503 -.25 6.8484 -1.4186 -.25 6.7501 -1.425 -.25 6.6522 1.2 -.25 6.6522
  [4,7,.7503,-.25,6.8484,-1.4186,-.25,6.7501,-1.425,-.25,6.6522,1.2,-.25,6.6522],
// 3 7 1.2 -.25 6.6522 -1.425 -.25 6.6522 -.875 -.25 .5272
  [3,7,1.2,-.25,6.6522,-1.425,-.25,6.6522,-.875,-.25,.5272],
// 4 7 1.2 -.25 6.6522 -.875 -.25 .5272 -.1909 -.25 -.0144 1.9255 -.25 -.0144
  [4,7,1.2,-.25,6.6522,-.875,-.25,.5272,-.1909,-.25,-.0144,1.9255,-.25,-.0144],
// 4 7 -6.09673 -.25 .22009 -3.70327 -.25 .22009 -4.35 -.25 .6522 -5.45 -.25 .6522
  [4,7,-6.09673,-.25,.22009,-3.70327,-.25,.22009,-4.35,-.25,.6522,-5.45,-.25,.6522],
// 4 7 -6.09673 -.25 .22009 -6.12613 -.25 .13336 -3.67387 -.25 .13336 -3.70327 -.25 .22009
  [4,7,-6.09673,-.25,.22009,-6.12613,-.25,.13336,-3.67387,-.25,.13336,-3.70327,-.25,.22009],
// 4 7 -6.14398 -.25 .04355 -3.65602 -.25 .04355 -3.67387 -.25 .13336 -6.12613 -.25 .13336
  [4,7,-6.14398,-.25,.04355,-3.65602,-.25,.04355,-3.67387,-.25,.13336,-6.12613,-.25,.13336],
// 4 7 -6.14398 -.25 .04355 -6.1478 -.25 -.0144 -3.6522 -.25 -.0144 -3.65602 -.25 .04355
  [4,7,-6.14398,-.25,.04355,-6.1478,-.25,-.0144,-3.6522,-.25,-.0144,-3.65602,-.25,.04355],
];
module ldraw_lib__s__6142622ms04(step=0, col=false, unit=2/5, alt=false, line=0.2, solid=!$preview)
    makepoly(ldraw_lib__s__6142622ms04(), step=step, col=col, unit=unit, alt=alt, line=line, solid=solid);
ldraw_lib__s__6142622ms04(line=0.2);
// file: s/6142622ms03.scad
use <../../lib.scad>
use <../../p/1-16chrd.scad>
use <../../p/1-16ndis.scad>
use <../../p/1-4chrd.scad>
use <../../p/1-4ndis.scad>
use <../../p/3-16chrd.scad>
use <../../p/3-16ndis.scad>
function ldraw_lib__s__6142622ms03() = [
// 0 ~Sticker  1.9 x  0.8 with Black Headlamp on Yellow Face Right - Upper Section 4
// 0 Name: s\6142622ms03.dat
// 0 Author: Massimo Maso [Sirio]
// 0 !LDRAW_ORG Subpart UPDATE 2022-03
// 0 !LICENSE Licensed under CC BY 2.0 and CC BY 4.0 : see CAreadme.txt
// 
// 0 BFC CERTIFY CCW
  [0,"BFC","CERTIFY"],
  [0,"BFC","CCW"],
// 
// 0 !HISTORY 2022-05-07 [PTadmin] Official Update 2022-03
// 
// 
// 0 // Primitives
// 1 0 -5.45 -.25 -4.1572 -.7 0 0 0 1 0 0 0 .7 1-4ndis.dat
  [1,0,-5.45,-.25,-4.1572,-.7,0,0,0,1,0,0,0,.7, ldraw_lib__1_4ndis()],
// 1 7 -5.45 -.25 -4.1572 -.7 0 0 0 1 0 0 0 .7 1-4chrd.dat
  [1,7,-5.45,-.25,-4.1572,-.7,0,0,0,1,0,0,0,.7, ldraw_lib__1_4chrd()],
// 1 7 -4.35 -.25 -4.1572 .7 0 0 0 1 0 0 0 .7 1-4chrd.dat
  [1,7,-4.35,-.25,-4.1572,.7,0,0,0,1,0,0,0,.7, ldraw_lib__1_4chrd()],
// 1 0 -4.35 -.25 -4.1572 .7 0 0 0 1 0 0 0 .7 1-4ndis.dat
  [1,0,-4.35,-.25,-4.1572,.7,0,0,0,1,0,0,0,.7, ldraw_lib__1_4ndis()],
// 1 7 -.675 -.25 -8 0 0 .75 0 1 0 .75 0 0 1-16chrd.dat
  [1,7,-.675,-.25,-8,0,0,.75,0,1,0,.75,0,0, ldraw_lib__1_16chrd()],
// 1 0 -.675 -.25 -7.2572 0 0 .75 0 1 0 .75 0 0 1-16ndis.dat
  [1,0,-.675,-.25,-7.2572,0,0,.75,0,1,0,.75,0,0, ldraw_lib__1_16ndis()],
// 1 7 -.675 -.25 -7.2572 0 0 -.75 0 1 0 .75 0 0 3-16chrd.dat
  [1,7,-.675,-.25,-7.2572,0,0,-.75,0,1,0,.75,0,0, ldraw_lib__3_16chrd()],
// 1 0 -.675 -.25 -7.2572 0 0 -.75 0 1 0 .75 0 0 3-16ndis.dat
  [1,0,-.675,-.25,-7.2572,0,0,-.75,0,1,0,.75,0,0, ldraw_lib__3_16ndis()],
// 0 // Yellow faces
// 3 14 8 -.25 .0128 .5491 -.25 .0128 2 -.25 -1.5072
  [3,14,8,-.25,.0128,.5491,-.25,.0128,2,-.25,-1.5072],
// 4 14 8 -.25 .0128 2 -.25 -1.5072 2.6526 -.25 -7.061 8 -.25 -7.061
  [4,14,8,-.25,.0128,2,-.25,-1.5072,2.6526,-.25,-7.061,8,-.25,-7.061],
// 0 // Black faces
// 3 0 -8 -.25 .0128 -6.15 -.25 -3.4572 -5.45 -.25 -3.4572
  [3,0,-8,-.25,.0128,-6.15,-.25,-3.4572,-5.45,-.25,-3.4572],
// 4 0 -8 -.25 .0128 -5.45 -.25 -3.4572 -4.35 -.25 -3.4572 .5491 -.25 .0128
  [4,0,-8,-.25,.0128,-5.45,-.25,-3.4572,-4.35,-.25,-3.4572,.5491,-.25,.0128],
// 3 0 .5491 -.25 .0128 -4.35 -.25 -3.4572 -3.65 -.25 -3.4572
  [3,0,.5491,-.25,.0128,-4.35,-.25,-3.4572,-3.65,-.25,-3.4572],
// 4 0 .5491 -.25 .0128 -3.65 -.25 -3.4572 -3.65 -.25 -4.1572 2 -.25 -1.5072
  [4,0,.5491,-.25,.0128,-3.65,-.25,-3.4572,-3.65,-.25,-4.1572,2,-.25,-1.5072],
// 4 0 2 -.25 -1.5072 -3.65 -.25 -4.1572 -.675 -.25 -6.5072 .075 -.25 -6.5072
  [4,0,2,-.25,-1.5072,-3.65,-.25,-4.1572,-.675,-.25,-6.5072,.075,-.25,-6.5072],
// 4 0 2 -.25 -1.5072 .075 -.25 -6.5072 .7503 -.25 -7.061 2.6526 -.25 -7.061
  [4,0,2,-.25,-1.5072,.075,-.25,-6.5072,.7503,-.25,-7.061,2.6526,-.25,-7.061],
// 4 0 -8 -.25 -7.061 -6.15 -.25 -4.1572 -6.15 -.25 -3.4572 -8 -.25 .0128
  [4,0,-8,-.25,-7.061,-6.15,-.25,-4.1572,-6.15,-.25,-3.4572,-8,-.25,.0128],
// 3 0 -8 -.25 -7.061 -6.15 -.25 -4.8572 -6.15 -.25 -4.1572
  [3,0,-8,-.25,-7.061,-6.15,-.25,-4.8572,-6.15,-.25,-4.1572],
// 4 0 -8 -.25 -7.061 -1.3987 -.25 -7.061 -3.65 -.25 -4.8572 -6.15 -.25 -4.8572
  [4,0,-8,-.25,-7.061,-1.3987,-.25,-7.061,-3.65,-.25,-4.8572,-6.15,-.25,-4.8572],
// 4 0 -3.65 -.25 -4.8572 -1.3987 -.25 -7.061 -1.367925 -.25 -6.970175 -1.425 -.25 -6.5072
  [4,0,-3.65,-.25,-4.8572,-1.3987,-.25,-7.061,-1.367925,-.25,-6.970175,-1.425,-.25,-6.5072],
// 4 0 -3.65 -.25 -4.8572 -1.425 -.25 -6.5072 -.675 -.25 -6.5072 -3.65 -.25 -4.1572
  [4,0,-3.65,-.25,-4.8572,-1.425,-.25,-6.5072,-.675,-.25,-6.5072,-3.65,-.25,-4.1572],
// 3 0 .7503 -.25 -7.061 .075 -.25 -6.5072 -.387975 -.25 -6.564275
  [3,0,.7503,-.25,-7.061,.075,-.25,-6.5072,-.387975,-.25,-6.564275],
// 0 // Light grey faces
// 4 7 -6.15 -.25 -4.1572 -3.65 -.25 -4.1572 -4.35 -.25 -3.4572 -5.45 -.25 -3.4572
  [4,7,-6.15,-.25,-4.1572,-3.65,-.25,-4.1572,-4.35,-.25,-3.4572,-5.45,-.25,-3.4572],
// 4 7 -6.15 -.25 -4.1572 -6.15 -.25 -4.8572 -3.65 -.25 -4.8572 -3.65 -.25 -4.1572
  [4,7,-6.15,-.25,-4.1572,-6.15,-.25,-4.8572,-3.65,-.25,-4.8572,-3.65,-.25,-4.1572],
// 4 7 -1.3987 -.25 -7.061 -.387975 -.25 -6.564275 -.675 -.25 -6.5072 -1.367925 -.25 -6.970175
  [4,7,-1.3987,-.25,-7.061,-.387975,-.25,-6.564275,-.675,-.25,-6.5072,-1.367925,-.25,-6.970175],
// 3 7 -1.3987 -.25 -7.061 .7503 -.25 -7.061 -.387975 -.25 -6.564275
  [3,7,-1.3987,-.25,-7.061,.7503,-.25,-7.061,-.387975,-.25,-6.564275],
];
module ldraw_lib__s__6142622ms03(step=0, col=false, unit=2/5, alt=false, line=0.2, solid=!$preview)
    makepoly(ldraw_lib__s__6142622ms03(), step=step, col=col, unit=unit, alt=alt, line=line, solid=solid);
ldraw_lib__s__6142622ms03(line=0.2);
// file: s/6142622ms02.scad
use <../../lib.scad>
use <../../p/1-4chrd.scad>
use <../../p/1-4ndis.scad>
function ldraw_lib__s__6142622ms02() = [
// 0 ~Sticker  1.9 x  0.8 with Black Headlamp on Yellow Face Right - Upper Section 3
// 0 Name: s\6142622ms02.dat
// 0 Author: Massimo Maso [Sirio]
// 0 !LDRAW_ORG Subpart UPDATE 2022-03
// 0 !LICENSE Licensed under CC BY 2.0 and CC BY 4.0 : see CAreadme.txt
// 
// 0 BFC CERTIFY CCW
  [0,"BFC","CERTIFY"],
  [0,"BFC","CCW"],
// 
// 0 !HISTORY 2022-05-07 [PTadmin] Official Update 2022-03
// 
// 
// 0 // Primitives
// 1 0 -5.45 -.25 .7172 -.7 0 0 0 1 0 0 0 .7 1-4ndis.dat
  [1,0,-5.45,-.25,.7172,-.7,0,0,0,1,0,0,0,.7, ldraw_lib__1_4ndis()],
// 1 7 -5.45 -.25 .7172 -.7 0 0 0 1 0 0 0 .7 1-4chrd.dat
  [1,7,-5.45,-.25,.7172,-.7,0,0,0,1,0,0,0,.7, ldraw_lib__1_4chrd()],
// 1 7 -4.35 -.25 .7172 .7 0 0 0 1 0 0 0 .7 1-4chrd.dat
  [1,7,-4.35,-.25,.7172,.7,0,0,0,1,0,0,0,.7, ldraw_lib__1_4chrd()],
// 1 0 -4.35 -.25 .7172 .7 0 0 0 1 0 0 0 .7 1-4ndis.dat
  [1,0,-4.35,-.25,.7172,.7,0,0,0,1,0,0,0,.7, ldraw_lib__1_4ndis()],
// 0 // Yellow faces
// 4 14 8 -.25 7.2284 -8 -.25 7.2284 -8 -.25 3.9672 -3.25 -.25 3.9672
  [4,14,8,-.25,7.2284,-8,-.25,7.2284,-8,-.25,3.9672,-3.25,-.25,3.9672],
// 4 14 8 -.25 7.2284 -3.25 -.25 3.9672 .5491 -.25 -.0128 8 -.25 -.0128
  [4,14,8,-.25,7.2284,-3.25,-.25,3.9672,.5491,-.25,-.0128,8,-.25,-.0128],
// 0 // Black faces
// 4 0 -8 -.25 3.9672 -8 -.25 -.0128 -6.15 -.25 .0172 -6.15 -.25 .7172
  [4,0,-8,-.25,3.9672,-8,-.25,-.0128,-6.15,-.25,.0172,-6.15,-.25,.7172],
// 3 0 -8 -.25 3.9672 -6.15 -.25 .7172 -6.15 -.25 1.4172
  [3,0,-8,-.25,3.9672,-6.15,-.25,.7172,-6.15,-.25,1.4172],
// 3 0 -8 -.25 3.9672 -6.15 -.25 1.4172 -5.45 -.25 1.4172
  [3,0,-8,-.25,3.9672,-6.15,-.25,1.4172,-5.45,-.25,1.4172],
// 4 0 -8 -.25 3.9672 -5.45 -.25 1.4172 -4.35 -.25 1.4172 -3.25 -.25 3.9672
  [4,0,-8,-.25,3.9672,-5.45,-.25,1.4172,-4.35,-.25,1.4172,-3.25,-.25,3.9672],
// 3 0 -3.25 -.25 3.9672 -4.35 -.25 1.4172 -3.65 -.25 1.4172
  [3,0,-3.25,-.25,3.9672,-4.35,-.25,1.4172,-3.65,-.25,1.4172],
// 4 0 .5491 -.25 -.0128 -3.25 -.25 3.9672 -3.65 -.25 1.4172 -3.65 -.25 .7172
  [4,0,.5491,-.25,-.0128,-3.25,-.25,3.9672,-3.65,-.25,1.4172,-3.65,-.25,.7172],
// 3 0 .5491 -.25 -.0128 -3.65 -.25 .7172 -3.65 -.25 .0172
  [3,0,.5491,-.25,-.0128,-3.65,-.25,.7172,-3.65,-.25,.0172],
// 4 0 .5491 -.25 -.0128 -3.65 -.25 .0172 -6.15 -.25 .0172 -8 -.25 -.0128
  [4,0,.5491,-.25,-.0128,-3.65,-.25,.0172,-6.15,-.25,.0172,-8,-.25,-.0128],
// 0 // Light grey faces
// 4 7 -6.15 -.25 .7172 -3.65 -.25 .7172 -4.35 -.25 1.4172 -5.45 -.25 1.4172
  [4,7,-6.15,-.25,.7172,-3.65,-.25,.7172,-4.35,-.25,1.4172,-5.45,-.25,1.4172],
// 4 7 -6.15 -.25 .7172 -6.15 -.25 .0172 -3.65 -.25 .0172 -3.65 -.25 .7172
  [4,7,-6.15,-.25,.7172,-6.15,-.25,.0172,-3.65,-.25,.0172,-3.65,-.25,.7172],
];
module ldraw_lib__s__6142622ms02(step=0, col=false, unit=2/5, alt=false, line=0.2, solid=!$preview)
    makepoly(ldraw_lib__s__6142622ms02(), step=step, col=col, unit=unit, alt=alt, line=line, solid=solid);
ldraw_lib__s__6142622ms02(line=0.2);
// file: s/6142622ms01.scad
use <../../lib.scad>
use <../../p/1-4chrd.scad>
function ldraw_lib__s__6142622ms01() = [
// 0 ~Sticker  1.9 x  0.8 with Black Headlamp on Yellow Background Right - Upper Section 1
// 0 Name: s\6142622ms01.dat
// 0 Author: Massimo Maso [Sirio]
// 0 !LDRAW_ORG Subpart UPDATE 2022-03
// 0 !LICENSE Licensed under CC BY 2.0 and CC BY 4.0 : see CAreadme.txt
// 
// 0 BFC CERTIFY CCW
  [0,"BFC","CERTIFY"],
  [0,"BFC","CCW"],
// 
// 0 !HISTORY 2022-05-07 [PTadmin] Official Update 2022-03
// 
// 
// 0 // Primitives
// 
// 1 14 -6.5 -.25 3.8922 -1.5 0 0 0 1 0 0 0 1.5 1-4chrd.dat
  [1,14,-6.5,-.25,3.8922,-1.5,0,0,0,1,0,0,0,1.5, ldraw_lib__1_4chrd()],
// 1 14 6.5 -.25 3.8922 1.5 0 0 0 1 0 0 0 1.5 1-4chrd.dat
  [1,14,6.5,-.25,3.8922,1.5,0,0,0,1,0,0,0,1.5, ldraw_lib__1_4chrd()],
// 0 // Faces
// 4 14 8 -.25 3.8922 6.5 -.25 5.3922 -6.5 -.25 5.3922 -8 -.25 3.8922
  [4,14,8,-.25,3.8922,6.5,-.25,5.3922,-6.5,-.25,5.3922,-8,-.25,3.8922],
// 4 14 -8 -.25 3.8922 -8 -.25 -.0121 8 -.25 -.0121 8 -.25 3.8922
  [4,14,-8,-.25,3.8922,-8,-.25,-.0121,8,-.25,-.0121,8,-.25,3.8922],
];
module ldraw_lib__s__6142622ms01(step=0, col=false, unit=2/5, alt=false, line=0.2, solid=!$preview)
    makepoly(ldraw_lib__s__6142622ms01(), step=step, col=col, unit=unit, alt=alt, line=line, solid=solid);
ldraw_lib__s__6142622ms01(line=0.2);
// main file
use <../lib.scad>
use <s/6142622ms01.scad>
use <s/6142622ms02.scad>
use <s/6142622ms03.scad>
use <s/6142622ms04.scad>
use <s/6142622ms05.scad>
use <s/6142622ms06.scad>
function ldraw_lib__6142622m() = [
// 0 Sticker  1.9 x  0.8 with Black Headlamp on Yellow Background Right
// 0 Name: 6142622m.dat
// 0 Author: Massimo Maso [Sirio]
// 0 !LDRAW_ORG Part UPDATE 2022-03
// 0 !LICENSE Licensed under CC BY 2.0 and CC BY 4.0 : see CAreadme.txt
// 
// 0 BFC CERTIFY CCW
  [0,"BFC","CERTIFY"],
  [0,"BFC","CCW"],
// 
// 0 !KEYWORDS Chevrolet, Corvette, Set 75870, Speed Champions
// 
// 0 !HISTORY 2022-05-07 [PTadmin] Official Update 2022-03
// 
// 
// 1 16 0 0 13.8789 1 0 0 0 1 0 0 0 1 s\6142622ms01.dat
  [1,16,0,0,13.8789,1,0,0,0,1,0,0,0,1, ldraw_lib__s__6142622ms01()],
// 4 14 -8 -.25 13.8668 -8 -.25 6.5112 8 -.25 6.5112 8 -.25 13.8668
  [4,14,-8,-.25,13.8668,-8,-.25,6.5112,8,-.25,6.5112,8,-.25,13.8668],
// 1 16 0 0 -.7172 1 0 0 0 1 0 0 0 1 s\6142622ms02.dat
  [1,16,0,0,-.7172,1,0,0,0,1,0,0,0,1, ldraw_lib__s__6142622ms02()],
// 1 16 0 0 -.7428 1 0 0 0 1 0 0 0 1 s\6142622ms03.dat
  [1,16,0,0,-.7428,1,0,0,0,1,0,0,0,1, ldraw_lib__s__6142622ms03()],
// 1 16 0 0 -14.6522 1 0 0 0 1 0 0 0 1 s\6142622ms04.dat
  [1,16,0,0,-14.6522,1,0,0,0,1,0,0,0,1, ldraw_lib__s__6142622ms04()],
// 1 16 0 0 -14.681 1 0 0 0 1 0 0 0 1 s\6142622ms05.dat
  [1,16,0,0,-14.681,1,0,0,0,1,0,0,0,1, ldraw_lib__s__6142622ms05()],
// 1 16 0 0 0 1 0 0 0 1 0 0 0 1 s\6142622ms06.dat
  [1,16,0,0,0,1,0,0,0,1,0,0,0,1, ldraw_lib__s__6142622ms06()],
];
module ldraw_lib__6142622m(step=0, col=false, unit=2/5, alt=false, line=0.2, solid=!$preview)
    makepoly(ldraw_lib__6142622m(), step=step, col=col, unit=unit, alt=alt, line=line, solid=solid);
ldraw_lib__6142622m(line=0.2);
